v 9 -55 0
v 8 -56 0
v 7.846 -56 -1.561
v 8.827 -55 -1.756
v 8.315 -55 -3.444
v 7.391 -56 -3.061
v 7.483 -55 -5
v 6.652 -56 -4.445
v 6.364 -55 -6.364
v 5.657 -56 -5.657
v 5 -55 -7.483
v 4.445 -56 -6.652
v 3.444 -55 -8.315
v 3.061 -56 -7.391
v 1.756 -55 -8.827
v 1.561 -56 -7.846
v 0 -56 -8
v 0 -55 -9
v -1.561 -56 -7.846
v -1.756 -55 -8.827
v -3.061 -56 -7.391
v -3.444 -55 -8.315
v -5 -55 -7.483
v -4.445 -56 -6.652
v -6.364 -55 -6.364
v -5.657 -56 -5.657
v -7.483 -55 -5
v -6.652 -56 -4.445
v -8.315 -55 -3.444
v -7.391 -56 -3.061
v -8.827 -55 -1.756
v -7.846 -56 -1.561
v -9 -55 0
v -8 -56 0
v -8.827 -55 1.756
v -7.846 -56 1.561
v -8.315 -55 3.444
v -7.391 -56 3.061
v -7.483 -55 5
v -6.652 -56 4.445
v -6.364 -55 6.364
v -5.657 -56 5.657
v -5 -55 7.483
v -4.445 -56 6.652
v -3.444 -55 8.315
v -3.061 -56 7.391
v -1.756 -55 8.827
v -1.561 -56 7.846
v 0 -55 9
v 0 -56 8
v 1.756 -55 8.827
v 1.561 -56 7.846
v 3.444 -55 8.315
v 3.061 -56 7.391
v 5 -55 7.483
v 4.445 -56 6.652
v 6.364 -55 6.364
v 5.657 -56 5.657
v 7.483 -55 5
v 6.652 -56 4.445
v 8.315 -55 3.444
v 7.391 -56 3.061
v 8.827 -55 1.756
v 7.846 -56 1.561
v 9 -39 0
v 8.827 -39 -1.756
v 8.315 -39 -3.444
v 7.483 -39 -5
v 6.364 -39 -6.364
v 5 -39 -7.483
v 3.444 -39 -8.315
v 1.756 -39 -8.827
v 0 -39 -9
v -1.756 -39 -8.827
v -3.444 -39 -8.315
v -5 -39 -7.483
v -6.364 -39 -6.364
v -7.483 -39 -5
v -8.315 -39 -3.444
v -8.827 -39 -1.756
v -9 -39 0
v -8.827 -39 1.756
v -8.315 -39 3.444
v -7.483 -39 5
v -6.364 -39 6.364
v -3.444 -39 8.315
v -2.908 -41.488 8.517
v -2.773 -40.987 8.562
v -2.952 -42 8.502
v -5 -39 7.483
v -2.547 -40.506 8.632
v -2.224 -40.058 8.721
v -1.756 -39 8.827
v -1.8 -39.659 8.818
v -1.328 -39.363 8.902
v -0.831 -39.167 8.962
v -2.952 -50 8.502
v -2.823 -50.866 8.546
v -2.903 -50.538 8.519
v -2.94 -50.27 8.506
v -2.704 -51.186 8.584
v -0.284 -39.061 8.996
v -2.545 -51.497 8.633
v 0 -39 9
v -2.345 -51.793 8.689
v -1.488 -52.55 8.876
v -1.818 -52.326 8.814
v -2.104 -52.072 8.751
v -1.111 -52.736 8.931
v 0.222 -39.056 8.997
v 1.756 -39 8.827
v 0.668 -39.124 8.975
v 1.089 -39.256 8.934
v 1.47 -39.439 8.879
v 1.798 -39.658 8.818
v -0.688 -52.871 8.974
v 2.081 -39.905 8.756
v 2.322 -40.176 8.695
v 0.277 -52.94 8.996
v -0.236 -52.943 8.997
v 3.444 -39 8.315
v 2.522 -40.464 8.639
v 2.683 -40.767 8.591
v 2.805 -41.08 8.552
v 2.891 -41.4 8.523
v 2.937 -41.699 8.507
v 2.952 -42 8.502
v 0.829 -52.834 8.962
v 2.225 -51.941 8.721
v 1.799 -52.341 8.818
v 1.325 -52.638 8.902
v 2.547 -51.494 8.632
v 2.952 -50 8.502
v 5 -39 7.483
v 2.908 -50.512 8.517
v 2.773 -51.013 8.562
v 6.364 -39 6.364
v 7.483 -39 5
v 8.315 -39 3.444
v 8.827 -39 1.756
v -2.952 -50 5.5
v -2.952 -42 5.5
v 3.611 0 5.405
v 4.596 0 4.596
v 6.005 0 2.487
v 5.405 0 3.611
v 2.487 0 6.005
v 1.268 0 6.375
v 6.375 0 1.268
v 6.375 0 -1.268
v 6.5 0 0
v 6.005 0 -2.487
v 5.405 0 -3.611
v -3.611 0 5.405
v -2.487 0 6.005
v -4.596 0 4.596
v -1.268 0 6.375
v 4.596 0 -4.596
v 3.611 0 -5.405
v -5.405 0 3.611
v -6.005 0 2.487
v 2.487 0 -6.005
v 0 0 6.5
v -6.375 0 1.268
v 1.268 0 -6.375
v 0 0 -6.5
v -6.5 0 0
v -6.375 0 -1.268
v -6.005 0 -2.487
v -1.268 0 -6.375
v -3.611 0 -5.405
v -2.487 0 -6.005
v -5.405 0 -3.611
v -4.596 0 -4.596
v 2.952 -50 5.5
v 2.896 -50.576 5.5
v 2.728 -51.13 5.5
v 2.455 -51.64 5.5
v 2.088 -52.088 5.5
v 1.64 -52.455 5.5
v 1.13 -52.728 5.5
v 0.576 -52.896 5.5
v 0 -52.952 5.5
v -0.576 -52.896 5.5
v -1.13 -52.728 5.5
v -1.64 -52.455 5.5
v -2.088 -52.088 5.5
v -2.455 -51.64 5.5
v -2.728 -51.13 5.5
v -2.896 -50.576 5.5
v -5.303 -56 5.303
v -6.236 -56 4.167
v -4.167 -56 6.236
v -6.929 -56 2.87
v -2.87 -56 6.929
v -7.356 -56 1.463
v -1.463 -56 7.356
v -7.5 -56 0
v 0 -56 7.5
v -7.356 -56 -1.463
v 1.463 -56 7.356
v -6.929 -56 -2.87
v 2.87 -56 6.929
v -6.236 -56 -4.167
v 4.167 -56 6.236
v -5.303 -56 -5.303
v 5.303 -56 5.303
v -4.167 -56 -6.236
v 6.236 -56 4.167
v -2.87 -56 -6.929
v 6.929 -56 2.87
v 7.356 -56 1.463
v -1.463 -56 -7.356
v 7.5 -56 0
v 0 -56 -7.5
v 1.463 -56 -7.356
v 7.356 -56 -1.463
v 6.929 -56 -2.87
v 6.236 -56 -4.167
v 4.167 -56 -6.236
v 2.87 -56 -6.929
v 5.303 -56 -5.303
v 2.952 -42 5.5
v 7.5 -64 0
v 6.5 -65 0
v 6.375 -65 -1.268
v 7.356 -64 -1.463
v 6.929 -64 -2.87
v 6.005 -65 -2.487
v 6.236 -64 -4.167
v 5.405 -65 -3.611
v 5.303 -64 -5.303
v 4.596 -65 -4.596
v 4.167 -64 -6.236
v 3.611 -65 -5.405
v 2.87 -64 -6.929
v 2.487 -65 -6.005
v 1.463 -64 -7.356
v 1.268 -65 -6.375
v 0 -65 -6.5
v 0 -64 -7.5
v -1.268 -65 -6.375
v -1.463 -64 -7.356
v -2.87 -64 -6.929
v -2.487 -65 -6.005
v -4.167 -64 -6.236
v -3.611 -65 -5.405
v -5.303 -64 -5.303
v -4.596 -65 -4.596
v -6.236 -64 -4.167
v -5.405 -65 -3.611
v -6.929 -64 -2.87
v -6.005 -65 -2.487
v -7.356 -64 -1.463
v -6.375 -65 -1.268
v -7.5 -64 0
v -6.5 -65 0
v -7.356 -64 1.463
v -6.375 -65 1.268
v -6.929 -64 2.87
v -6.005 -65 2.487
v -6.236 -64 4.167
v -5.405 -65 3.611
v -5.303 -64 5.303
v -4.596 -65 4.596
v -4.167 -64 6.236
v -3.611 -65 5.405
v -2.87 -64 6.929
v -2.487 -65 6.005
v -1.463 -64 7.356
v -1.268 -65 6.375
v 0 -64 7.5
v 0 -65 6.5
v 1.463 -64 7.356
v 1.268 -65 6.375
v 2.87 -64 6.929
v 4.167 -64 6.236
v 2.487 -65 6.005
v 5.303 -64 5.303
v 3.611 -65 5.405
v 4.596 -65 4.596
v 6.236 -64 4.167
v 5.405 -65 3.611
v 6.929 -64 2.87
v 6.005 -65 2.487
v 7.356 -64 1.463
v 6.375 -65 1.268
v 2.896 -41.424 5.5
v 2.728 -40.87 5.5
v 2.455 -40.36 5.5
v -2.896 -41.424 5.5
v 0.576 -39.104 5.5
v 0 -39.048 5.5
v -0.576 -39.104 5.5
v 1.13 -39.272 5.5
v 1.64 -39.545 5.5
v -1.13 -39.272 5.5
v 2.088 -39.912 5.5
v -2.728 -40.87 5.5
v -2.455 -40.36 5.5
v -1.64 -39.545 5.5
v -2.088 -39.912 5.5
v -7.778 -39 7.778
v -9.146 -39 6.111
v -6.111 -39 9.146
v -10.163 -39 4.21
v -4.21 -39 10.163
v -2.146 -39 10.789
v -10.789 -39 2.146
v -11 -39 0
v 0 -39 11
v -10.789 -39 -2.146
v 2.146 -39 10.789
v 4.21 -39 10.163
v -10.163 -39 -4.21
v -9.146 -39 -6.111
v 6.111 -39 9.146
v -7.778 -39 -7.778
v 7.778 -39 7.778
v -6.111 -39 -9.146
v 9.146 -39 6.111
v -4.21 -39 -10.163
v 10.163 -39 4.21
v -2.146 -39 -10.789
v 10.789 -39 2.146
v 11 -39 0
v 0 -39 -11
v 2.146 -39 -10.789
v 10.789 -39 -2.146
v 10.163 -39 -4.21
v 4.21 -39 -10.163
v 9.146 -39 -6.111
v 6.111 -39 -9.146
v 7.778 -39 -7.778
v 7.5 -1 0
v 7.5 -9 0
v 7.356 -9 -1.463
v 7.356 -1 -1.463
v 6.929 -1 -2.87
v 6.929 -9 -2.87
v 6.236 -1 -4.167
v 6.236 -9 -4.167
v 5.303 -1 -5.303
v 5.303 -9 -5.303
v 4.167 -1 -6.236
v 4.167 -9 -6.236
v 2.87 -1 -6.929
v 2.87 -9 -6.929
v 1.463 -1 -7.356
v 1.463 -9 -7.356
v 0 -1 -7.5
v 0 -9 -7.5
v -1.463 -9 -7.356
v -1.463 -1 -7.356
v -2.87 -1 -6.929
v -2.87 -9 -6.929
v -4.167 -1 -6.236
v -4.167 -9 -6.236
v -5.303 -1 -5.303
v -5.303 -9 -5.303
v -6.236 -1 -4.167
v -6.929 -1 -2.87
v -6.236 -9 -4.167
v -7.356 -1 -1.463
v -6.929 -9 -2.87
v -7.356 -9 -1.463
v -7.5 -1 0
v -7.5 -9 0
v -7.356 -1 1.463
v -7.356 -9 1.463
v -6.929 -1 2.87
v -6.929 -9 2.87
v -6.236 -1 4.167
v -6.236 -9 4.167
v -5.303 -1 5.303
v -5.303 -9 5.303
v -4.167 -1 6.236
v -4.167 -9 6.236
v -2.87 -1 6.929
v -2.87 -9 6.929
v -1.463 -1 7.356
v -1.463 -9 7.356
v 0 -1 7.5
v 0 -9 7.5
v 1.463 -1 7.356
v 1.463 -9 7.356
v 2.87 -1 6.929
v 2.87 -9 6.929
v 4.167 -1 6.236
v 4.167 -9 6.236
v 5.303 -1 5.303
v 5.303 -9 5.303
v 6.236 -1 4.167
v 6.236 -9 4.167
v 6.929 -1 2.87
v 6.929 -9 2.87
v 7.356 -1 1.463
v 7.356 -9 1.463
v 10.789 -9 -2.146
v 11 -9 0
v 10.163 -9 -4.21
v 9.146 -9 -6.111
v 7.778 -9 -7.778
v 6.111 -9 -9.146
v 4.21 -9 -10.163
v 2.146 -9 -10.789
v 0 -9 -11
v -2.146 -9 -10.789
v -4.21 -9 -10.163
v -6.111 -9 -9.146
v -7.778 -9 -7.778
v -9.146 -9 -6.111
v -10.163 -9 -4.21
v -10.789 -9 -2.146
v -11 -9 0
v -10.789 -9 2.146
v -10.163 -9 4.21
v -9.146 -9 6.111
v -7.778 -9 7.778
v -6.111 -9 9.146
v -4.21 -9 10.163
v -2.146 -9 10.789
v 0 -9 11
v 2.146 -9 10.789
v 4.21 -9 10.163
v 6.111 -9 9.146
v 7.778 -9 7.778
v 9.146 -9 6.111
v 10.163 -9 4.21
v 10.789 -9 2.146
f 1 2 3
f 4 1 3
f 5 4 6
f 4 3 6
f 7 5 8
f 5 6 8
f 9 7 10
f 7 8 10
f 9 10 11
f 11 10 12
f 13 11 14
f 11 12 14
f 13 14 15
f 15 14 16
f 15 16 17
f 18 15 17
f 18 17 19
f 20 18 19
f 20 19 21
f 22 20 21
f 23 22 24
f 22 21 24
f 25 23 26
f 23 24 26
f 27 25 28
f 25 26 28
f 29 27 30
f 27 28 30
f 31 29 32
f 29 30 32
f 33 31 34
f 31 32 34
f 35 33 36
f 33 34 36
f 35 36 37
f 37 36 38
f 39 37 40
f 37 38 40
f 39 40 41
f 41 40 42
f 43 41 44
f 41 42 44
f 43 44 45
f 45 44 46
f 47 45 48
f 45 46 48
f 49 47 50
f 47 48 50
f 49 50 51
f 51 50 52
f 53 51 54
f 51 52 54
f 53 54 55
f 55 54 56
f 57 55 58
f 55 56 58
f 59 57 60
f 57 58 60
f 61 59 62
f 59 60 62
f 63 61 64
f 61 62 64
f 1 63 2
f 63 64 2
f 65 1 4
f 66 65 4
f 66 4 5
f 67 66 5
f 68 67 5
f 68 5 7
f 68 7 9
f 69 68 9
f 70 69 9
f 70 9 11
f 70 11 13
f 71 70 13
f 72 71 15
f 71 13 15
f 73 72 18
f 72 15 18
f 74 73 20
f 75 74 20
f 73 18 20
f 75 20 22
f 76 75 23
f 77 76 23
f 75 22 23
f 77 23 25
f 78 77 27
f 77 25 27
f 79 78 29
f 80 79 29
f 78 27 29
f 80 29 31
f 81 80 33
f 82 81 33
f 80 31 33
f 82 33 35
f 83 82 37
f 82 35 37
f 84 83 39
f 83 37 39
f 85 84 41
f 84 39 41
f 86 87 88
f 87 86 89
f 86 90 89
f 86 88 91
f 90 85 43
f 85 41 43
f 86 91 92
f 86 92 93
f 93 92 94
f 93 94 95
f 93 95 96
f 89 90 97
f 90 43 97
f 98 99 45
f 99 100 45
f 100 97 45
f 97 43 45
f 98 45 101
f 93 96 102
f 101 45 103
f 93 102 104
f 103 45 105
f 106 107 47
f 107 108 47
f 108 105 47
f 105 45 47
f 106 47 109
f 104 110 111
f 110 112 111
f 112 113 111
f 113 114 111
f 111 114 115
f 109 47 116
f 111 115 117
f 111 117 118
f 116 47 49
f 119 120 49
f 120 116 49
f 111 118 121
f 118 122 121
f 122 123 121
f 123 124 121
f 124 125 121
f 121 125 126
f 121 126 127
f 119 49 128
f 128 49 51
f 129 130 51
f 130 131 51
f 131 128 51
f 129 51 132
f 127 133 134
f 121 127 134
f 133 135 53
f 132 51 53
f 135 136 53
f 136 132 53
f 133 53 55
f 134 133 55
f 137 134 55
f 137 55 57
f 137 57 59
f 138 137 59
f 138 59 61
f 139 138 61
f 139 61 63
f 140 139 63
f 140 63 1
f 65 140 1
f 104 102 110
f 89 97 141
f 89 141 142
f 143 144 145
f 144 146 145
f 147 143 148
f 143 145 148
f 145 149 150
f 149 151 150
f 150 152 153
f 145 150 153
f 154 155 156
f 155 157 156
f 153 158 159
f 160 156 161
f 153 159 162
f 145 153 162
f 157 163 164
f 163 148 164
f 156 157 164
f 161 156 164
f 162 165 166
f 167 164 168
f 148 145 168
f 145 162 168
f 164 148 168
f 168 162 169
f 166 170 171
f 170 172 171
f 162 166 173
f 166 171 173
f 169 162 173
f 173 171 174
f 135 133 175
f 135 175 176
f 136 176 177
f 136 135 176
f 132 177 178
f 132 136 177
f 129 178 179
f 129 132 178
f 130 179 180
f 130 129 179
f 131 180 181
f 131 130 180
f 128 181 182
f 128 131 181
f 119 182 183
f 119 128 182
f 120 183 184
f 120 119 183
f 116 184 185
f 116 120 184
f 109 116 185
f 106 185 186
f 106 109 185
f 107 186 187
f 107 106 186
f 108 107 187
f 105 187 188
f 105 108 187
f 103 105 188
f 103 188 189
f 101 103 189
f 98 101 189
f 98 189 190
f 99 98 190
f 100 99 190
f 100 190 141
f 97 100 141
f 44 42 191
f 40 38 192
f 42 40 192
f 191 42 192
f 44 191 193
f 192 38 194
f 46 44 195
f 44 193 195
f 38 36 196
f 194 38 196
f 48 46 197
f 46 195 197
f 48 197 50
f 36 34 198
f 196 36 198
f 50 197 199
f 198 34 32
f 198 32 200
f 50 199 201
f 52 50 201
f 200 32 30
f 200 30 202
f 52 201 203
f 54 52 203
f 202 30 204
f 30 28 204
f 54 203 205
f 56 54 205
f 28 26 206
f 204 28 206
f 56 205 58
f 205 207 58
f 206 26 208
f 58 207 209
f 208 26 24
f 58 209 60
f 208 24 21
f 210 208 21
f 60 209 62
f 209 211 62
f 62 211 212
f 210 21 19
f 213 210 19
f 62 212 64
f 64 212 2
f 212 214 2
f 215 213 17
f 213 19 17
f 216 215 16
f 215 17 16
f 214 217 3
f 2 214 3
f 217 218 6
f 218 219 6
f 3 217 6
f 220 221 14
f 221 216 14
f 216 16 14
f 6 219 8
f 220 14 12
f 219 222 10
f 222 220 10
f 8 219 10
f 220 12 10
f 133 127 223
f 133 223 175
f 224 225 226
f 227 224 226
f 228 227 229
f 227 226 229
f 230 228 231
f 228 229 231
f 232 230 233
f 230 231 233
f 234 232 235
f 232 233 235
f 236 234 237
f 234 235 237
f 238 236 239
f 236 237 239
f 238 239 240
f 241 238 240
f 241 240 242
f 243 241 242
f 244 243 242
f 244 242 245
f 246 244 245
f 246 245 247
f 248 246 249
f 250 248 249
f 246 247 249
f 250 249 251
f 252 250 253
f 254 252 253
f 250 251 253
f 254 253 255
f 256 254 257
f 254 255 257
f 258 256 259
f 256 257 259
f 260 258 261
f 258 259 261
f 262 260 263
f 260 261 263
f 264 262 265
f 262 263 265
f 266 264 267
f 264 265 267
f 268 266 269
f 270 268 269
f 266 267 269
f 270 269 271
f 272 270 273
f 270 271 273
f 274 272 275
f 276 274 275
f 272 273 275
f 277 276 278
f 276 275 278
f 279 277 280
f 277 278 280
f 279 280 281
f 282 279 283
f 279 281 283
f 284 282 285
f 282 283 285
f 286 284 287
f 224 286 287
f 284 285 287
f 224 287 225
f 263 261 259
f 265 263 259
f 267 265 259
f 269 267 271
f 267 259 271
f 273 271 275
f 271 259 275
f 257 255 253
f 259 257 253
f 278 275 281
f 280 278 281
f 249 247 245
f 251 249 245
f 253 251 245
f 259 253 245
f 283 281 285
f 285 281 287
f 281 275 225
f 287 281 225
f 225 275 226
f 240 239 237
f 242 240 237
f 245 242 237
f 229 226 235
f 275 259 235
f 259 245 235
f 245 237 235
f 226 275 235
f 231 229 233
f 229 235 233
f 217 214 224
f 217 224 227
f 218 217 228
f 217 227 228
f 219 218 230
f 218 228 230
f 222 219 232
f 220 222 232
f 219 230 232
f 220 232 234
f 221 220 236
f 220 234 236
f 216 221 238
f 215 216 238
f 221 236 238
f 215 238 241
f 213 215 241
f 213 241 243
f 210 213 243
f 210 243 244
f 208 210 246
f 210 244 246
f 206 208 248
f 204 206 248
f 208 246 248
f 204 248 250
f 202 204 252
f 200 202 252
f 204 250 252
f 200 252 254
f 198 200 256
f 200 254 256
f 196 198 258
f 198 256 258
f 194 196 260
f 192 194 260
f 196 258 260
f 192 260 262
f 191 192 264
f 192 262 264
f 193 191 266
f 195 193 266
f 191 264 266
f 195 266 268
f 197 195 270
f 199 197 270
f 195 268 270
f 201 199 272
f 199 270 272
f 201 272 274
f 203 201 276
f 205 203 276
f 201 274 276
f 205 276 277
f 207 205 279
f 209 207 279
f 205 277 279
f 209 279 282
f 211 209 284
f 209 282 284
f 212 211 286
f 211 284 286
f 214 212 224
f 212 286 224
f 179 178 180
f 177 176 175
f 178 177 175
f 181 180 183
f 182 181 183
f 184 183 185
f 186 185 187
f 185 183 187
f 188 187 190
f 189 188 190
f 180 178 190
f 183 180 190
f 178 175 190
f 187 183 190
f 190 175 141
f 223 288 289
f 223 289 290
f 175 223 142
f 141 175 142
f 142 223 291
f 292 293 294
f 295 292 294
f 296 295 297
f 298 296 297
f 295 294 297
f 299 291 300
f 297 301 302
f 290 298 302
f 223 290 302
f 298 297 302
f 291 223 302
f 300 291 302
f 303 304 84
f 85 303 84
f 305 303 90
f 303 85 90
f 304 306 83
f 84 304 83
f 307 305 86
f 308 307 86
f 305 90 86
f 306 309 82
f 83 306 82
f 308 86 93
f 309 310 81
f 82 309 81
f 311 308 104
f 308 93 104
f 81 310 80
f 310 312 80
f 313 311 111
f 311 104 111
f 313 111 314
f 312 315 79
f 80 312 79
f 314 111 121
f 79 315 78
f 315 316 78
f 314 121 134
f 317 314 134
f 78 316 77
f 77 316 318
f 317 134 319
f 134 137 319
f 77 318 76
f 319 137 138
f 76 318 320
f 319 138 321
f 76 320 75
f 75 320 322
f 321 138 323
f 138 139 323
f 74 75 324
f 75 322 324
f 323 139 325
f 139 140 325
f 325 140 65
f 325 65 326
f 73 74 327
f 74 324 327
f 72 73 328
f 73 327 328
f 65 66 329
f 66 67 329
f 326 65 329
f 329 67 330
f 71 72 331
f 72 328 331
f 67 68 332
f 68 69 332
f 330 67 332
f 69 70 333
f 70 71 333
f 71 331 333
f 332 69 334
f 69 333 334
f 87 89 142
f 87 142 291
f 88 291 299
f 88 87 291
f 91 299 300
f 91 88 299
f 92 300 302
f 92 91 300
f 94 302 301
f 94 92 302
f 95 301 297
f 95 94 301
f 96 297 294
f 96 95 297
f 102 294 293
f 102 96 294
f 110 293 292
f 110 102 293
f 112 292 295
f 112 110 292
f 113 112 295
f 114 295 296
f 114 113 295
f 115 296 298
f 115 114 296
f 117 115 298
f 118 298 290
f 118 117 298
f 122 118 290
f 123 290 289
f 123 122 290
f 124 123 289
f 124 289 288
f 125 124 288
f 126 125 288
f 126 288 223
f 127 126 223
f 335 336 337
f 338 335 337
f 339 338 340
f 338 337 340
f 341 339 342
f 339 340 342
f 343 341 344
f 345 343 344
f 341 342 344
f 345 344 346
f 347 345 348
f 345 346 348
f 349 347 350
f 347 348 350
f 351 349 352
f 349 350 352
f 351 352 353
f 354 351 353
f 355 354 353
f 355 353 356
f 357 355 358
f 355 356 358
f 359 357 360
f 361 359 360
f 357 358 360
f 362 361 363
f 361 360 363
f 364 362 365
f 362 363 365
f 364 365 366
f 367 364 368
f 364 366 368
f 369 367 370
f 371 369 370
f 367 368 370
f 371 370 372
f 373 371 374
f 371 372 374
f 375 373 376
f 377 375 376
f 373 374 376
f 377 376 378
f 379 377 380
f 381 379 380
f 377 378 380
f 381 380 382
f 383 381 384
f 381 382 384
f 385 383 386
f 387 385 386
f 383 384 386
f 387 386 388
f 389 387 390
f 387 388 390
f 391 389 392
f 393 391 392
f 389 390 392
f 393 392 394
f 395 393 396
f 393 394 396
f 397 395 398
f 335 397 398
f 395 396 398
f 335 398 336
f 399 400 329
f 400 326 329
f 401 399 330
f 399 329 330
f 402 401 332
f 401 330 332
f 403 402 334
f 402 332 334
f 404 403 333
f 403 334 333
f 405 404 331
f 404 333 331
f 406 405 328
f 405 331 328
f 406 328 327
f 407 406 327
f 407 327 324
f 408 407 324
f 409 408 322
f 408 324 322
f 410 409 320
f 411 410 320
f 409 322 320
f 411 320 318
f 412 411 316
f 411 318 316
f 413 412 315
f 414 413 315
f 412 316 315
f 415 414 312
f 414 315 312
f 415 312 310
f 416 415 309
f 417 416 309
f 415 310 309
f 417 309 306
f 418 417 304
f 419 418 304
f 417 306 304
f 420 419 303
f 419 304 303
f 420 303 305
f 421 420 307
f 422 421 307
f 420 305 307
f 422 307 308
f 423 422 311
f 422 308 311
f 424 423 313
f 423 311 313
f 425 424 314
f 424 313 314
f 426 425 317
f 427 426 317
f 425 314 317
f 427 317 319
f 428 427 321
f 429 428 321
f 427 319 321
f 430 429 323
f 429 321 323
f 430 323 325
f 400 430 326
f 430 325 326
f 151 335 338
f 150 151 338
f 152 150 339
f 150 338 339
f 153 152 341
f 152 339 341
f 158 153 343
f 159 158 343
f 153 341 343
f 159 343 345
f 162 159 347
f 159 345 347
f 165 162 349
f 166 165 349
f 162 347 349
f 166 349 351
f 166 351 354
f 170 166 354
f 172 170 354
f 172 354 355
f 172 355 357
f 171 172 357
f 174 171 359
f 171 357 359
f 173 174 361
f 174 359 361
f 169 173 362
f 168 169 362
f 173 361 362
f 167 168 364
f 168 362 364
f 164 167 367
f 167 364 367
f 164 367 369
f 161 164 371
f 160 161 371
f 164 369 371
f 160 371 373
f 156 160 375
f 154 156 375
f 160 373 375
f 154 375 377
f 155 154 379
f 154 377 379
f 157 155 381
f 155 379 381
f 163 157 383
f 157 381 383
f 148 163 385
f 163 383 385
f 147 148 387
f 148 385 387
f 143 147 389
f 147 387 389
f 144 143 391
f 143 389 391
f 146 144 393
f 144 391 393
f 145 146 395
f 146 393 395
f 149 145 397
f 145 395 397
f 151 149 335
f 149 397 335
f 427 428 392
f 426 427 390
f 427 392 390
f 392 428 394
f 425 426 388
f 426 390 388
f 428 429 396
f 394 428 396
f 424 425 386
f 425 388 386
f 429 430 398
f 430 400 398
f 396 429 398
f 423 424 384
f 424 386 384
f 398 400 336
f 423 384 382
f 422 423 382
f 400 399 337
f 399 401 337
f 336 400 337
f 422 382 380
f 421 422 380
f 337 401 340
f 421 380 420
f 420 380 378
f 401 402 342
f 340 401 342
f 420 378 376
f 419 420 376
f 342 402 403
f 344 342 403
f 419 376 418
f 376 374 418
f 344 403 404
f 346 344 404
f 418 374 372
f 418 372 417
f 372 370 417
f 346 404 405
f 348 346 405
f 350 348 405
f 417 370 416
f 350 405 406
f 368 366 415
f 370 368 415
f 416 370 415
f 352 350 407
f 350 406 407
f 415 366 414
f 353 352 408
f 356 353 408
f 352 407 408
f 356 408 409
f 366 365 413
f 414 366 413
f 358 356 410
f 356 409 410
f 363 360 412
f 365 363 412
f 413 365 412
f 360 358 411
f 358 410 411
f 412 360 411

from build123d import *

# Parameters (mm, degrees)
CHAMFER1_SIZE      = 1
CUT_EXTRUDE1_DEPTH = 3.5


with BuildPart() as part:
    # Sketch1 → Revolve1 (revolve)
    with BuildSketch(Plane.XY):
        Polygon((0, 0), (7.5, 0), (7.5, -9), (11, -9), (11, -39), (9, -39), (9, -56), (7.5, -56), (7.5, -65), (0, -65), align=None)
    revolve(axis=Axis((0, -65, 0), (0, 1, 0)))

    # Chamfer1
    chamfer1_edges = [part.edges().sort_by_distance(p)[0] for p in [
        (-7.5, 0, 0),
        (-7.5, -65, 0),
        (-9, -56, 0),
    ]]
    chamfer(chamfer1_edges, length=CHAMFER1_SIZE)

    # Sketch4 → Cut-Extrude1 (cut)
    with BuildSketch(Plane.XY.offset(9)):
        with BuildLine():
            Line((2.952489762, -42), (2.952489762, -50))
            ThreePointArc((2.952489762, -50), (0, -52.952489762), (-2.952489762, -50))
            Line((-2.952489762, -50), (-2.952489762, -42))
            ThreePointArc((-2.952489762, -42), (0, -39.047510238), (2.952489762, -42))
        make_face()
    extrude(amount=-CUT_EXTRUDE1_DEPTH, mode=Mode.SUBTRACT)


solid = part.part
